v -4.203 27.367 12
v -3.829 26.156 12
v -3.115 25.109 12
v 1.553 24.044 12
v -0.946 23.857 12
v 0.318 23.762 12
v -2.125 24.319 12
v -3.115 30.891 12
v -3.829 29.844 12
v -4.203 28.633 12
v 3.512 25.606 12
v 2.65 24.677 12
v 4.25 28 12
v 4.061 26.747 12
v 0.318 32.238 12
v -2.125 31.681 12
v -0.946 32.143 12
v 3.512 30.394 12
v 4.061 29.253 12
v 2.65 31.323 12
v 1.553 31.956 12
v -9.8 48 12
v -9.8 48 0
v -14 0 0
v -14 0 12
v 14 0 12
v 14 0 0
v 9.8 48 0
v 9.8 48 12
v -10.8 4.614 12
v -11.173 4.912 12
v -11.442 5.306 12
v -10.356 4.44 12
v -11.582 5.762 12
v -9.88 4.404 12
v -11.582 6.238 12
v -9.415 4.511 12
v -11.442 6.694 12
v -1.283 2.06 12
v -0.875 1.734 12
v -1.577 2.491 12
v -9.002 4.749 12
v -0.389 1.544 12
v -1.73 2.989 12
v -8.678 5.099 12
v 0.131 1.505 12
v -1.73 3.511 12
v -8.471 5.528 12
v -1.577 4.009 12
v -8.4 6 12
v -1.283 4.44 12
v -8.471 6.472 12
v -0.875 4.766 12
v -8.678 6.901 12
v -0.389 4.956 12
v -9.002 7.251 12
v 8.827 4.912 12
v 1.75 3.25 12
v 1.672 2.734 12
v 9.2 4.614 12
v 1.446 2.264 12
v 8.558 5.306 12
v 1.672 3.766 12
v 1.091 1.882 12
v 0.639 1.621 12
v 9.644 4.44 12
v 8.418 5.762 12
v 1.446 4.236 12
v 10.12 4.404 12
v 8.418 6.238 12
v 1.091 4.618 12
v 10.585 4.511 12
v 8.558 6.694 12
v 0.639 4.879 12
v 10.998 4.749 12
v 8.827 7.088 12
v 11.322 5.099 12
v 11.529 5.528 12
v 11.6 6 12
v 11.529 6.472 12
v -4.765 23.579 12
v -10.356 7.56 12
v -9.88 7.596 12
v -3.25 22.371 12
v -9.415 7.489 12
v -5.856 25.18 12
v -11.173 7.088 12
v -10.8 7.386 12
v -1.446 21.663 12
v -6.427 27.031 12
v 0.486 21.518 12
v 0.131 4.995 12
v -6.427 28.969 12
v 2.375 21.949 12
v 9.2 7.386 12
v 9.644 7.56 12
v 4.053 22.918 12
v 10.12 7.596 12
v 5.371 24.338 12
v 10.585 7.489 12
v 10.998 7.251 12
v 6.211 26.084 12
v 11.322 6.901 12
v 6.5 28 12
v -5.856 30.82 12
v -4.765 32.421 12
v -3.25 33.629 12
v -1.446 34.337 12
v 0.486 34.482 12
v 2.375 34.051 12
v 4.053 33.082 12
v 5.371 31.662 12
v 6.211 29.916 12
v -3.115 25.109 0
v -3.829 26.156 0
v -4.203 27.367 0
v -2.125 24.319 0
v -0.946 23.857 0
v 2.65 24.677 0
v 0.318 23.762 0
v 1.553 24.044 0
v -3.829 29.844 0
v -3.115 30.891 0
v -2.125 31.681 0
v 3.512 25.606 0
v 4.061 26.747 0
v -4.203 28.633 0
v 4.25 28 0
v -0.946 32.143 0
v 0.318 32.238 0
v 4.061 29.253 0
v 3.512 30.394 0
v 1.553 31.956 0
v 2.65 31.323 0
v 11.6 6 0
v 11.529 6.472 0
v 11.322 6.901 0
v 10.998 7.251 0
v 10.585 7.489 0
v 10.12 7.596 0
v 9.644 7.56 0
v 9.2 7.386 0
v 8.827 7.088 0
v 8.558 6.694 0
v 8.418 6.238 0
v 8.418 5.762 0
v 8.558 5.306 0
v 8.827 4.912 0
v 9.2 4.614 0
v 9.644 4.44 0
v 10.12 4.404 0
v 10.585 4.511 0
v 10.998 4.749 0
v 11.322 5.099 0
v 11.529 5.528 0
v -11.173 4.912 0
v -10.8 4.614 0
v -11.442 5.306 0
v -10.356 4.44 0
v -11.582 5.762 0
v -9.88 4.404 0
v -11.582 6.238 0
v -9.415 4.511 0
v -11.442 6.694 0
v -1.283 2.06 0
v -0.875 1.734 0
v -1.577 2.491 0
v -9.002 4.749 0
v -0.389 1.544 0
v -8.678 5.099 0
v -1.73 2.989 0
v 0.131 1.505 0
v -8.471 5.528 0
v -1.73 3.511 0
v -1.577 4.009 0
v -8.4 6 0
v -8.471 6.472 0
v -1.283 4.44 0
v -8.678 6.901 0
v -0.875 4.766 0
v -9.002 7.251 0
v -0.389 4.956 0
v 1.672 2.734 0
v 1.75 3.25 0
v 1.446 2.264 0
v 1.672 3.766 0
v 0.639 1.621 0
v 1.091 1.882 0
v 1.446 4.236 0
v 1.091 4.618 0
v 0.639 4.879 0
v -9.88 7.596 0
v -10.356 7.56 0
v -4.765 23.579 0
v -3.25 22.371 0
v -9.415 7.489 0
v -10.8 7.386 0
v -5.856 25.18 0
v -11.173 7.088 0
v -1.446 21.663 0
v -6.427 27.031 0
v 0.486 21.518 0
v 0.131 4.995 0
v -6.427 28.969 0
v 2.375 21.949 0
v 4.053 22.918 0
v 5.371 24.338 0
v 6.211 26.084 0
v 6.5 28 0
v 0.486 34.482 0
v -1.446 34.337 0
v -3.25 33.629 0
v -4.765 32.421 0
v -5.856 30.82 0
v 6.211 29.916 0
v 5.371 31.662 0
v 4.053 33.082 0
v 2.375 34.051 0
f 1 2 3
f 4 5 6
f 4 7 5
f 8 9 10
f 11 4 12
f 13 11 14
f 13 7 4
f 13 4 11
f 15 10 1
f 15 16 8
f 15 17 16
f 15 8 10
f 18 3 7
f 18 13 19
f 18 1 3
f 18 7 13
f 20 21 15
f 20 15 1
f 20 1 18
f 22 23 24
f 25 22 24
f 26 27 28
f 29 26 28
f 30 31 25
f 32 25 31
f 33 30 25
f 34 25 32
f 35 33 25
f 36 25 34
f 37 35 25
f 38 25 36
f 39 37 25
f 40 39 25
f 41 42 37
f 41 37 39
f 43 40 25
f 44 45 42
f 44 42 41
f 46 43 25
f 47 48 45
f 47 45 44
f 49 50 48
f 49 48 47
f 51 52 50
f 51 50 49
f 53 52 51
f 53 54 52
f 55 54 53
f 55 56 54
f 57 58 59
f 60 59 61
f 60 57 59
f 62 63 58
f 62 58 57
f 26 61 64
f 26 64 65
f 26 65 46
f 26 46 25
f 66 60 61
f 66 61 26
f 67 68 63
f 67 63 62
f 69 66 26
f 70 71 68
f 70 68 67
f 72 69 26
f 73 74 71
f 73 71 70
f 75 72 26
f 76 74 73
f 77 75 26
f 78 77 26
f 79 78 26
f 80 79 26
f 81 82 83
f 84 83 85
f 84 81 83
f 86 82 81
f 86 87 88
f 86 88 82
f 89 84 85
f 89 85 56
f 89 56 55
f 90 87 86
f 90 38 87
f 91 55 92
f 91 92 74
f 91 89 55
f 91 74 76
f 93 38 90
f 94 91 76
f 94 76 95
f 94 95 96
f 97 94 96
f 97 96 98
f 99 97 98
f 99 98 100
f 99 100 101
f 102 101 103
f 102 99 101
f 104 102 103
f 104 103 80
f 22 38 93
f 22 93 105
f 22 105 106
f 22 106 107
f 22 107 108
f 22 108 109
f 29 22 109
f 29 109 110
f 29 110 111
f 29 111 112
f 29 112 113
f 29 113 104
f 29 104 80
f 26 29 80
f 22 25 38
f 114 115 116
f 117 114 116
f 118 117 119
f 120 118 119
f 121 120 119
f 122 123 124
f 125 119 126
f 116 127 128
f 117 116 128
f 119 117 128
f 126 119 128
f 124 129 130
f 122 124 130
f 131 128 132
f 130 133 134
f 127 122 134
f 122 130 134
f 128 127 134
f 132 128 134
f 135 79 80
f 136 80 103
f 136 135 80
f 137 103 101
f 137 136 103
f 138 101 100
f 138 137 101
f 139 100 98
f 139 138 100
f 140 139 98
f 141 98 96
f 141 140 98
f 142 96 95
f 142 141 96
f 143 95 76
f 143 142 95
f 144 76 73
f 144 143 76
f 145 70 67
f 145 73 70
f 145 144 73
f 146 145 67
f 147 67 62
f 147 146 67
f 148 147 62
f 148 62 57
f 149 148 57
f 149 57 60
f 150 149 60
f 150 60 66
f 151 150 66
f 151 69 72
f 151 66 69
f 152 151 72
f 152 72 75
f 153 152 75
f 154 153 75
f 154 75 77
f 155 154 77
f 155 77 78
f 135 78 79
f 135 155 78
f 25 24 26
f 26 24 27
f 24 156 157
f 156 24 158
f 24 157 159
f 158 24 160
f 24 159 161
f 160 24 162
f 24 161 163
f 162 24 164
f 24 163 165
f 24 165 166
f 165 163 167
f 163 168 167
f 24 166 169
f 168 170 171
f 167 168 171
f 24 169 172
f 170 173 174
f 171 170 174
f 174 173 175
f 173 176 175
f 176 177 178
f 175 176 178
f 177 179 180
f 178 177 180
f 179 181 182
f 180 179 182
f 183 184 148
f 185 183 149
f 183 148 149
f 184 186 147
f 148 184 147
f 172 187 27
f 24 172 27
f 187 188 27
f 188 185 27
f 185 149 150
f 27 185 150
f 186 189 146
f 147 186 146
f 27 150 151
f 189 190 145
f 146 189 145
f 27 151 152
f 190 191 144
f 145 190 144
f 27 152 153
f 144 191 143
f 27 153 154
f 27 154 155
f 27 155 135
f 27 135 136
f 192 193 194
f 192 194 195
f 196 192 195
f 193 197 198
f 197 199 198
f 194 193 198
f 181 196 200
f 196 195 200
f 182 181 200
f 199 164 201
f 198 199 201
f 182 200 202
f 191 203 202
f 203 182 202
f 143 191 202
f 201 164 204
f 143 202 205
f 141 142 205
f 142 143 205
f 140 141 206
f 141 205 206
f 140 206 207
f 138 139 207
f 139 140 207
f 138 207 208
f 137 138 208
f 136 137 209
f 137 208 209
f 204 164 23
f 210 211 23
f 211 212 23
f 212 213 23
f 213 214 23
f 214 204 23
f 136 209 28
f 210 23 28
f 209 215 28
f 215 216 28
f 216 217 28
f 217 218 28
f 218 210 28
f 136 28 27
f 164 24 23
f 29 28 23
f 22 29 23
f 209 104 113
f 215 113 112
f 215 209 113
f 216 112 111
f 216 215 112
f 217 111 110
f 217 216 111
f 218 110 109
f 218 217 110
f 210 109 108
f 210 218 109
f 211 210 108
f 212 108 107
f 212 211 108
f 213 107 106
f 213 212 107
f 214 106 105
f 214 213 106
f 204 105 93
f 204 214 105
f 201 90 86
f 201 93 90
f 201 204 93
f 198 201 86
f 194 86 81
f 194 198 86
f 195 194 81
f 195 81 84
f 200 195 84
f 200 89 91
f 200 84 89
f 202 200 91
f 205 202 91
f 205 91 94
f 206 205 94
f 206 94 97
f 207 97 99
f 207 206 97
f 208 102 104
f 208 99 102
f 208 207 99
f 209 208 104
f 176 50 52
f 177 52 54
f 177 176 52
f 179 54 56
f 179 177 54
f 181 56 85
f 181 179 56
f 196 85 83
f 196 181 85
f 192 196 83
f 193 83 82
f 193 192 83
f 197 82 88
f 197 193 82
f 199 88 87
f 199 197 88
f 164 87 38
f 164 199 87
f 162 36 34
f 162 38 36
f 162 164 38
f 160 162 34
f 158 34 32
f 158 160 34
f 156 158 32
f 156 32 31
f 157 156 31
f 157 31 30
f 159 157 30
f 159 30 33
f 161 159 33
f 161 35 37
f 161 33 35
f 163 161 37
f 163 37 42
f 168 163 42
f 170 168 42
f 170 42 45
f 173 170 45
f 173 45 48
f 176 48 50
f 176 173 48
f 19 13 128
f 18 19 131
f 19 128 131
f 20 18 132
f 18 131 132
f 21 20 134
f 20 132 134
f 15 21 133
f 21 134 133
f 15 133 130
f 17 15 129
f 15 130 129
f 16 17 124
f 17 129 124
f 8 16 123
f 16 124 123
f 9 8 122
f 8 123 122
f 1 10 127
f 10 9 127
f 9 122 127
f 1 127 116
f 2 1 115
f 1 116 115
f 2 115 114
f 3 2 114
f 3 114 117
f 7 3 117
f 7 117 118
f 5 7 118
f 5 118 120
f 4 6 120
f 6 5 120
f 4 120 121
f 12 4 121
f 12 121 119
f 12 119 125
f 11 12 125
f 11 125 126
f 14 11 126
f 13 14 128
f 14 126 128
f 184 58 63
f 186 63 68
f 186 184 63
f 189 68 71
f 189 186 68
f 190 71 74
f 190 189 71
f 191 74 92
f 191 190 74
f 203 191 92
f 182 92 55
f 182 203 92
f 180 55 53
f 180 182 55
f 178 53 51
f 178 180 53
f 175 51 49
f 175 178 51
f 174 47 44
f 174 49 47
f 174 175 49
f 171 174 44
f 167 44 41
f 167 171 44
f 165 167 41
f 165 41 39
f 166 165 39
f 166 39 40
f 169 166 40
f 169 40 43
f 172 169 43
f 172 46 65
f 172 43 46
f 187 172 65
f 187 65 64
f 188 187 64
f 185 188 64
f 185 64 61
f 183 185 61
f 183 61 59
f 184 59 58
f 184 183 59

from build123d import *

# Parameters (mm, degrees)
BOSS_EXTRUDE1_DEPTH = 12
SKETCH2_R           = 1.6
SKETCH2_R_2         = 1.75
SKETCH2_R_3         = 6.5
SKETCH2_R_4         = 4.25
CUT_EXTRUDE2_DEPTH  = 13


with BuildPart() as part:
    # Sketch1 → Boss-Extrude1 (new body)
    with BuildSketch(Plane.XY):
        Polygon((-14, 0), (14, 0), (9.8, 48), (-9.8, 48), align=None)
    extrude(amount=BOSS_EXTRUDE1_DEPTH)

    # Sketch2 → Cut-Extrude2 (cut)
    # profile 1 of 5: a face of its own
    with BuildSketch(Plane.XY):
        with Locations((10, 6)):
            Circle(SKETCH2_R)
    # profile 2 of 5: a face of its own
    with BuildSketch(Plane.XY):
        with Locations((-10, 6)):
            Circle(SKETCH2_R)
    # profile 3 of 5: a face of its own
    with BuildSketch(Plane.XY):
        with Locations((0, 52.75)):
            Circle(SKETCH2_R_2)
    # profile 4 of 5: a face of its own
    with BuildSketch(Plane.XY):
        with Locations((0, 3.25)):
            Circle(SKETCH2_R_2)
    # profile 5 of 5: a face of its own
    with BuildSketch(Plane.XY):
        with Locations((0, 28)):
            Circle(SKETCH2_R_3)
        with Locations((0, 28)):
            Circle(SKETCH2_R_4, mode=Mode.SUBTRACT)
    extrude(amount=CUT_EXTRUDE2_DEPTH, mode=Mode.SUBTRACT)


with BuildPart() as cut_extrude2_piece_1:
    # of the separate pieces the step leaves, piece 1, a body of its own (cut_extrude2_pieces)
    add(part.part.solids().sort_by_distance((-14, 0, 0))[0])


with BuildPart() as cut_extrude2_piece_2:
    # of the separate pieces the step leaves, piece 2, a body of its own (cut_extrude2_pieces)
    add(part.part.solids().sort_by_distance((4.25, 28, 0))[0])


solid = Compound([cut_extrude2_piece_1.part, cut_extrude2_piece_2.part])
